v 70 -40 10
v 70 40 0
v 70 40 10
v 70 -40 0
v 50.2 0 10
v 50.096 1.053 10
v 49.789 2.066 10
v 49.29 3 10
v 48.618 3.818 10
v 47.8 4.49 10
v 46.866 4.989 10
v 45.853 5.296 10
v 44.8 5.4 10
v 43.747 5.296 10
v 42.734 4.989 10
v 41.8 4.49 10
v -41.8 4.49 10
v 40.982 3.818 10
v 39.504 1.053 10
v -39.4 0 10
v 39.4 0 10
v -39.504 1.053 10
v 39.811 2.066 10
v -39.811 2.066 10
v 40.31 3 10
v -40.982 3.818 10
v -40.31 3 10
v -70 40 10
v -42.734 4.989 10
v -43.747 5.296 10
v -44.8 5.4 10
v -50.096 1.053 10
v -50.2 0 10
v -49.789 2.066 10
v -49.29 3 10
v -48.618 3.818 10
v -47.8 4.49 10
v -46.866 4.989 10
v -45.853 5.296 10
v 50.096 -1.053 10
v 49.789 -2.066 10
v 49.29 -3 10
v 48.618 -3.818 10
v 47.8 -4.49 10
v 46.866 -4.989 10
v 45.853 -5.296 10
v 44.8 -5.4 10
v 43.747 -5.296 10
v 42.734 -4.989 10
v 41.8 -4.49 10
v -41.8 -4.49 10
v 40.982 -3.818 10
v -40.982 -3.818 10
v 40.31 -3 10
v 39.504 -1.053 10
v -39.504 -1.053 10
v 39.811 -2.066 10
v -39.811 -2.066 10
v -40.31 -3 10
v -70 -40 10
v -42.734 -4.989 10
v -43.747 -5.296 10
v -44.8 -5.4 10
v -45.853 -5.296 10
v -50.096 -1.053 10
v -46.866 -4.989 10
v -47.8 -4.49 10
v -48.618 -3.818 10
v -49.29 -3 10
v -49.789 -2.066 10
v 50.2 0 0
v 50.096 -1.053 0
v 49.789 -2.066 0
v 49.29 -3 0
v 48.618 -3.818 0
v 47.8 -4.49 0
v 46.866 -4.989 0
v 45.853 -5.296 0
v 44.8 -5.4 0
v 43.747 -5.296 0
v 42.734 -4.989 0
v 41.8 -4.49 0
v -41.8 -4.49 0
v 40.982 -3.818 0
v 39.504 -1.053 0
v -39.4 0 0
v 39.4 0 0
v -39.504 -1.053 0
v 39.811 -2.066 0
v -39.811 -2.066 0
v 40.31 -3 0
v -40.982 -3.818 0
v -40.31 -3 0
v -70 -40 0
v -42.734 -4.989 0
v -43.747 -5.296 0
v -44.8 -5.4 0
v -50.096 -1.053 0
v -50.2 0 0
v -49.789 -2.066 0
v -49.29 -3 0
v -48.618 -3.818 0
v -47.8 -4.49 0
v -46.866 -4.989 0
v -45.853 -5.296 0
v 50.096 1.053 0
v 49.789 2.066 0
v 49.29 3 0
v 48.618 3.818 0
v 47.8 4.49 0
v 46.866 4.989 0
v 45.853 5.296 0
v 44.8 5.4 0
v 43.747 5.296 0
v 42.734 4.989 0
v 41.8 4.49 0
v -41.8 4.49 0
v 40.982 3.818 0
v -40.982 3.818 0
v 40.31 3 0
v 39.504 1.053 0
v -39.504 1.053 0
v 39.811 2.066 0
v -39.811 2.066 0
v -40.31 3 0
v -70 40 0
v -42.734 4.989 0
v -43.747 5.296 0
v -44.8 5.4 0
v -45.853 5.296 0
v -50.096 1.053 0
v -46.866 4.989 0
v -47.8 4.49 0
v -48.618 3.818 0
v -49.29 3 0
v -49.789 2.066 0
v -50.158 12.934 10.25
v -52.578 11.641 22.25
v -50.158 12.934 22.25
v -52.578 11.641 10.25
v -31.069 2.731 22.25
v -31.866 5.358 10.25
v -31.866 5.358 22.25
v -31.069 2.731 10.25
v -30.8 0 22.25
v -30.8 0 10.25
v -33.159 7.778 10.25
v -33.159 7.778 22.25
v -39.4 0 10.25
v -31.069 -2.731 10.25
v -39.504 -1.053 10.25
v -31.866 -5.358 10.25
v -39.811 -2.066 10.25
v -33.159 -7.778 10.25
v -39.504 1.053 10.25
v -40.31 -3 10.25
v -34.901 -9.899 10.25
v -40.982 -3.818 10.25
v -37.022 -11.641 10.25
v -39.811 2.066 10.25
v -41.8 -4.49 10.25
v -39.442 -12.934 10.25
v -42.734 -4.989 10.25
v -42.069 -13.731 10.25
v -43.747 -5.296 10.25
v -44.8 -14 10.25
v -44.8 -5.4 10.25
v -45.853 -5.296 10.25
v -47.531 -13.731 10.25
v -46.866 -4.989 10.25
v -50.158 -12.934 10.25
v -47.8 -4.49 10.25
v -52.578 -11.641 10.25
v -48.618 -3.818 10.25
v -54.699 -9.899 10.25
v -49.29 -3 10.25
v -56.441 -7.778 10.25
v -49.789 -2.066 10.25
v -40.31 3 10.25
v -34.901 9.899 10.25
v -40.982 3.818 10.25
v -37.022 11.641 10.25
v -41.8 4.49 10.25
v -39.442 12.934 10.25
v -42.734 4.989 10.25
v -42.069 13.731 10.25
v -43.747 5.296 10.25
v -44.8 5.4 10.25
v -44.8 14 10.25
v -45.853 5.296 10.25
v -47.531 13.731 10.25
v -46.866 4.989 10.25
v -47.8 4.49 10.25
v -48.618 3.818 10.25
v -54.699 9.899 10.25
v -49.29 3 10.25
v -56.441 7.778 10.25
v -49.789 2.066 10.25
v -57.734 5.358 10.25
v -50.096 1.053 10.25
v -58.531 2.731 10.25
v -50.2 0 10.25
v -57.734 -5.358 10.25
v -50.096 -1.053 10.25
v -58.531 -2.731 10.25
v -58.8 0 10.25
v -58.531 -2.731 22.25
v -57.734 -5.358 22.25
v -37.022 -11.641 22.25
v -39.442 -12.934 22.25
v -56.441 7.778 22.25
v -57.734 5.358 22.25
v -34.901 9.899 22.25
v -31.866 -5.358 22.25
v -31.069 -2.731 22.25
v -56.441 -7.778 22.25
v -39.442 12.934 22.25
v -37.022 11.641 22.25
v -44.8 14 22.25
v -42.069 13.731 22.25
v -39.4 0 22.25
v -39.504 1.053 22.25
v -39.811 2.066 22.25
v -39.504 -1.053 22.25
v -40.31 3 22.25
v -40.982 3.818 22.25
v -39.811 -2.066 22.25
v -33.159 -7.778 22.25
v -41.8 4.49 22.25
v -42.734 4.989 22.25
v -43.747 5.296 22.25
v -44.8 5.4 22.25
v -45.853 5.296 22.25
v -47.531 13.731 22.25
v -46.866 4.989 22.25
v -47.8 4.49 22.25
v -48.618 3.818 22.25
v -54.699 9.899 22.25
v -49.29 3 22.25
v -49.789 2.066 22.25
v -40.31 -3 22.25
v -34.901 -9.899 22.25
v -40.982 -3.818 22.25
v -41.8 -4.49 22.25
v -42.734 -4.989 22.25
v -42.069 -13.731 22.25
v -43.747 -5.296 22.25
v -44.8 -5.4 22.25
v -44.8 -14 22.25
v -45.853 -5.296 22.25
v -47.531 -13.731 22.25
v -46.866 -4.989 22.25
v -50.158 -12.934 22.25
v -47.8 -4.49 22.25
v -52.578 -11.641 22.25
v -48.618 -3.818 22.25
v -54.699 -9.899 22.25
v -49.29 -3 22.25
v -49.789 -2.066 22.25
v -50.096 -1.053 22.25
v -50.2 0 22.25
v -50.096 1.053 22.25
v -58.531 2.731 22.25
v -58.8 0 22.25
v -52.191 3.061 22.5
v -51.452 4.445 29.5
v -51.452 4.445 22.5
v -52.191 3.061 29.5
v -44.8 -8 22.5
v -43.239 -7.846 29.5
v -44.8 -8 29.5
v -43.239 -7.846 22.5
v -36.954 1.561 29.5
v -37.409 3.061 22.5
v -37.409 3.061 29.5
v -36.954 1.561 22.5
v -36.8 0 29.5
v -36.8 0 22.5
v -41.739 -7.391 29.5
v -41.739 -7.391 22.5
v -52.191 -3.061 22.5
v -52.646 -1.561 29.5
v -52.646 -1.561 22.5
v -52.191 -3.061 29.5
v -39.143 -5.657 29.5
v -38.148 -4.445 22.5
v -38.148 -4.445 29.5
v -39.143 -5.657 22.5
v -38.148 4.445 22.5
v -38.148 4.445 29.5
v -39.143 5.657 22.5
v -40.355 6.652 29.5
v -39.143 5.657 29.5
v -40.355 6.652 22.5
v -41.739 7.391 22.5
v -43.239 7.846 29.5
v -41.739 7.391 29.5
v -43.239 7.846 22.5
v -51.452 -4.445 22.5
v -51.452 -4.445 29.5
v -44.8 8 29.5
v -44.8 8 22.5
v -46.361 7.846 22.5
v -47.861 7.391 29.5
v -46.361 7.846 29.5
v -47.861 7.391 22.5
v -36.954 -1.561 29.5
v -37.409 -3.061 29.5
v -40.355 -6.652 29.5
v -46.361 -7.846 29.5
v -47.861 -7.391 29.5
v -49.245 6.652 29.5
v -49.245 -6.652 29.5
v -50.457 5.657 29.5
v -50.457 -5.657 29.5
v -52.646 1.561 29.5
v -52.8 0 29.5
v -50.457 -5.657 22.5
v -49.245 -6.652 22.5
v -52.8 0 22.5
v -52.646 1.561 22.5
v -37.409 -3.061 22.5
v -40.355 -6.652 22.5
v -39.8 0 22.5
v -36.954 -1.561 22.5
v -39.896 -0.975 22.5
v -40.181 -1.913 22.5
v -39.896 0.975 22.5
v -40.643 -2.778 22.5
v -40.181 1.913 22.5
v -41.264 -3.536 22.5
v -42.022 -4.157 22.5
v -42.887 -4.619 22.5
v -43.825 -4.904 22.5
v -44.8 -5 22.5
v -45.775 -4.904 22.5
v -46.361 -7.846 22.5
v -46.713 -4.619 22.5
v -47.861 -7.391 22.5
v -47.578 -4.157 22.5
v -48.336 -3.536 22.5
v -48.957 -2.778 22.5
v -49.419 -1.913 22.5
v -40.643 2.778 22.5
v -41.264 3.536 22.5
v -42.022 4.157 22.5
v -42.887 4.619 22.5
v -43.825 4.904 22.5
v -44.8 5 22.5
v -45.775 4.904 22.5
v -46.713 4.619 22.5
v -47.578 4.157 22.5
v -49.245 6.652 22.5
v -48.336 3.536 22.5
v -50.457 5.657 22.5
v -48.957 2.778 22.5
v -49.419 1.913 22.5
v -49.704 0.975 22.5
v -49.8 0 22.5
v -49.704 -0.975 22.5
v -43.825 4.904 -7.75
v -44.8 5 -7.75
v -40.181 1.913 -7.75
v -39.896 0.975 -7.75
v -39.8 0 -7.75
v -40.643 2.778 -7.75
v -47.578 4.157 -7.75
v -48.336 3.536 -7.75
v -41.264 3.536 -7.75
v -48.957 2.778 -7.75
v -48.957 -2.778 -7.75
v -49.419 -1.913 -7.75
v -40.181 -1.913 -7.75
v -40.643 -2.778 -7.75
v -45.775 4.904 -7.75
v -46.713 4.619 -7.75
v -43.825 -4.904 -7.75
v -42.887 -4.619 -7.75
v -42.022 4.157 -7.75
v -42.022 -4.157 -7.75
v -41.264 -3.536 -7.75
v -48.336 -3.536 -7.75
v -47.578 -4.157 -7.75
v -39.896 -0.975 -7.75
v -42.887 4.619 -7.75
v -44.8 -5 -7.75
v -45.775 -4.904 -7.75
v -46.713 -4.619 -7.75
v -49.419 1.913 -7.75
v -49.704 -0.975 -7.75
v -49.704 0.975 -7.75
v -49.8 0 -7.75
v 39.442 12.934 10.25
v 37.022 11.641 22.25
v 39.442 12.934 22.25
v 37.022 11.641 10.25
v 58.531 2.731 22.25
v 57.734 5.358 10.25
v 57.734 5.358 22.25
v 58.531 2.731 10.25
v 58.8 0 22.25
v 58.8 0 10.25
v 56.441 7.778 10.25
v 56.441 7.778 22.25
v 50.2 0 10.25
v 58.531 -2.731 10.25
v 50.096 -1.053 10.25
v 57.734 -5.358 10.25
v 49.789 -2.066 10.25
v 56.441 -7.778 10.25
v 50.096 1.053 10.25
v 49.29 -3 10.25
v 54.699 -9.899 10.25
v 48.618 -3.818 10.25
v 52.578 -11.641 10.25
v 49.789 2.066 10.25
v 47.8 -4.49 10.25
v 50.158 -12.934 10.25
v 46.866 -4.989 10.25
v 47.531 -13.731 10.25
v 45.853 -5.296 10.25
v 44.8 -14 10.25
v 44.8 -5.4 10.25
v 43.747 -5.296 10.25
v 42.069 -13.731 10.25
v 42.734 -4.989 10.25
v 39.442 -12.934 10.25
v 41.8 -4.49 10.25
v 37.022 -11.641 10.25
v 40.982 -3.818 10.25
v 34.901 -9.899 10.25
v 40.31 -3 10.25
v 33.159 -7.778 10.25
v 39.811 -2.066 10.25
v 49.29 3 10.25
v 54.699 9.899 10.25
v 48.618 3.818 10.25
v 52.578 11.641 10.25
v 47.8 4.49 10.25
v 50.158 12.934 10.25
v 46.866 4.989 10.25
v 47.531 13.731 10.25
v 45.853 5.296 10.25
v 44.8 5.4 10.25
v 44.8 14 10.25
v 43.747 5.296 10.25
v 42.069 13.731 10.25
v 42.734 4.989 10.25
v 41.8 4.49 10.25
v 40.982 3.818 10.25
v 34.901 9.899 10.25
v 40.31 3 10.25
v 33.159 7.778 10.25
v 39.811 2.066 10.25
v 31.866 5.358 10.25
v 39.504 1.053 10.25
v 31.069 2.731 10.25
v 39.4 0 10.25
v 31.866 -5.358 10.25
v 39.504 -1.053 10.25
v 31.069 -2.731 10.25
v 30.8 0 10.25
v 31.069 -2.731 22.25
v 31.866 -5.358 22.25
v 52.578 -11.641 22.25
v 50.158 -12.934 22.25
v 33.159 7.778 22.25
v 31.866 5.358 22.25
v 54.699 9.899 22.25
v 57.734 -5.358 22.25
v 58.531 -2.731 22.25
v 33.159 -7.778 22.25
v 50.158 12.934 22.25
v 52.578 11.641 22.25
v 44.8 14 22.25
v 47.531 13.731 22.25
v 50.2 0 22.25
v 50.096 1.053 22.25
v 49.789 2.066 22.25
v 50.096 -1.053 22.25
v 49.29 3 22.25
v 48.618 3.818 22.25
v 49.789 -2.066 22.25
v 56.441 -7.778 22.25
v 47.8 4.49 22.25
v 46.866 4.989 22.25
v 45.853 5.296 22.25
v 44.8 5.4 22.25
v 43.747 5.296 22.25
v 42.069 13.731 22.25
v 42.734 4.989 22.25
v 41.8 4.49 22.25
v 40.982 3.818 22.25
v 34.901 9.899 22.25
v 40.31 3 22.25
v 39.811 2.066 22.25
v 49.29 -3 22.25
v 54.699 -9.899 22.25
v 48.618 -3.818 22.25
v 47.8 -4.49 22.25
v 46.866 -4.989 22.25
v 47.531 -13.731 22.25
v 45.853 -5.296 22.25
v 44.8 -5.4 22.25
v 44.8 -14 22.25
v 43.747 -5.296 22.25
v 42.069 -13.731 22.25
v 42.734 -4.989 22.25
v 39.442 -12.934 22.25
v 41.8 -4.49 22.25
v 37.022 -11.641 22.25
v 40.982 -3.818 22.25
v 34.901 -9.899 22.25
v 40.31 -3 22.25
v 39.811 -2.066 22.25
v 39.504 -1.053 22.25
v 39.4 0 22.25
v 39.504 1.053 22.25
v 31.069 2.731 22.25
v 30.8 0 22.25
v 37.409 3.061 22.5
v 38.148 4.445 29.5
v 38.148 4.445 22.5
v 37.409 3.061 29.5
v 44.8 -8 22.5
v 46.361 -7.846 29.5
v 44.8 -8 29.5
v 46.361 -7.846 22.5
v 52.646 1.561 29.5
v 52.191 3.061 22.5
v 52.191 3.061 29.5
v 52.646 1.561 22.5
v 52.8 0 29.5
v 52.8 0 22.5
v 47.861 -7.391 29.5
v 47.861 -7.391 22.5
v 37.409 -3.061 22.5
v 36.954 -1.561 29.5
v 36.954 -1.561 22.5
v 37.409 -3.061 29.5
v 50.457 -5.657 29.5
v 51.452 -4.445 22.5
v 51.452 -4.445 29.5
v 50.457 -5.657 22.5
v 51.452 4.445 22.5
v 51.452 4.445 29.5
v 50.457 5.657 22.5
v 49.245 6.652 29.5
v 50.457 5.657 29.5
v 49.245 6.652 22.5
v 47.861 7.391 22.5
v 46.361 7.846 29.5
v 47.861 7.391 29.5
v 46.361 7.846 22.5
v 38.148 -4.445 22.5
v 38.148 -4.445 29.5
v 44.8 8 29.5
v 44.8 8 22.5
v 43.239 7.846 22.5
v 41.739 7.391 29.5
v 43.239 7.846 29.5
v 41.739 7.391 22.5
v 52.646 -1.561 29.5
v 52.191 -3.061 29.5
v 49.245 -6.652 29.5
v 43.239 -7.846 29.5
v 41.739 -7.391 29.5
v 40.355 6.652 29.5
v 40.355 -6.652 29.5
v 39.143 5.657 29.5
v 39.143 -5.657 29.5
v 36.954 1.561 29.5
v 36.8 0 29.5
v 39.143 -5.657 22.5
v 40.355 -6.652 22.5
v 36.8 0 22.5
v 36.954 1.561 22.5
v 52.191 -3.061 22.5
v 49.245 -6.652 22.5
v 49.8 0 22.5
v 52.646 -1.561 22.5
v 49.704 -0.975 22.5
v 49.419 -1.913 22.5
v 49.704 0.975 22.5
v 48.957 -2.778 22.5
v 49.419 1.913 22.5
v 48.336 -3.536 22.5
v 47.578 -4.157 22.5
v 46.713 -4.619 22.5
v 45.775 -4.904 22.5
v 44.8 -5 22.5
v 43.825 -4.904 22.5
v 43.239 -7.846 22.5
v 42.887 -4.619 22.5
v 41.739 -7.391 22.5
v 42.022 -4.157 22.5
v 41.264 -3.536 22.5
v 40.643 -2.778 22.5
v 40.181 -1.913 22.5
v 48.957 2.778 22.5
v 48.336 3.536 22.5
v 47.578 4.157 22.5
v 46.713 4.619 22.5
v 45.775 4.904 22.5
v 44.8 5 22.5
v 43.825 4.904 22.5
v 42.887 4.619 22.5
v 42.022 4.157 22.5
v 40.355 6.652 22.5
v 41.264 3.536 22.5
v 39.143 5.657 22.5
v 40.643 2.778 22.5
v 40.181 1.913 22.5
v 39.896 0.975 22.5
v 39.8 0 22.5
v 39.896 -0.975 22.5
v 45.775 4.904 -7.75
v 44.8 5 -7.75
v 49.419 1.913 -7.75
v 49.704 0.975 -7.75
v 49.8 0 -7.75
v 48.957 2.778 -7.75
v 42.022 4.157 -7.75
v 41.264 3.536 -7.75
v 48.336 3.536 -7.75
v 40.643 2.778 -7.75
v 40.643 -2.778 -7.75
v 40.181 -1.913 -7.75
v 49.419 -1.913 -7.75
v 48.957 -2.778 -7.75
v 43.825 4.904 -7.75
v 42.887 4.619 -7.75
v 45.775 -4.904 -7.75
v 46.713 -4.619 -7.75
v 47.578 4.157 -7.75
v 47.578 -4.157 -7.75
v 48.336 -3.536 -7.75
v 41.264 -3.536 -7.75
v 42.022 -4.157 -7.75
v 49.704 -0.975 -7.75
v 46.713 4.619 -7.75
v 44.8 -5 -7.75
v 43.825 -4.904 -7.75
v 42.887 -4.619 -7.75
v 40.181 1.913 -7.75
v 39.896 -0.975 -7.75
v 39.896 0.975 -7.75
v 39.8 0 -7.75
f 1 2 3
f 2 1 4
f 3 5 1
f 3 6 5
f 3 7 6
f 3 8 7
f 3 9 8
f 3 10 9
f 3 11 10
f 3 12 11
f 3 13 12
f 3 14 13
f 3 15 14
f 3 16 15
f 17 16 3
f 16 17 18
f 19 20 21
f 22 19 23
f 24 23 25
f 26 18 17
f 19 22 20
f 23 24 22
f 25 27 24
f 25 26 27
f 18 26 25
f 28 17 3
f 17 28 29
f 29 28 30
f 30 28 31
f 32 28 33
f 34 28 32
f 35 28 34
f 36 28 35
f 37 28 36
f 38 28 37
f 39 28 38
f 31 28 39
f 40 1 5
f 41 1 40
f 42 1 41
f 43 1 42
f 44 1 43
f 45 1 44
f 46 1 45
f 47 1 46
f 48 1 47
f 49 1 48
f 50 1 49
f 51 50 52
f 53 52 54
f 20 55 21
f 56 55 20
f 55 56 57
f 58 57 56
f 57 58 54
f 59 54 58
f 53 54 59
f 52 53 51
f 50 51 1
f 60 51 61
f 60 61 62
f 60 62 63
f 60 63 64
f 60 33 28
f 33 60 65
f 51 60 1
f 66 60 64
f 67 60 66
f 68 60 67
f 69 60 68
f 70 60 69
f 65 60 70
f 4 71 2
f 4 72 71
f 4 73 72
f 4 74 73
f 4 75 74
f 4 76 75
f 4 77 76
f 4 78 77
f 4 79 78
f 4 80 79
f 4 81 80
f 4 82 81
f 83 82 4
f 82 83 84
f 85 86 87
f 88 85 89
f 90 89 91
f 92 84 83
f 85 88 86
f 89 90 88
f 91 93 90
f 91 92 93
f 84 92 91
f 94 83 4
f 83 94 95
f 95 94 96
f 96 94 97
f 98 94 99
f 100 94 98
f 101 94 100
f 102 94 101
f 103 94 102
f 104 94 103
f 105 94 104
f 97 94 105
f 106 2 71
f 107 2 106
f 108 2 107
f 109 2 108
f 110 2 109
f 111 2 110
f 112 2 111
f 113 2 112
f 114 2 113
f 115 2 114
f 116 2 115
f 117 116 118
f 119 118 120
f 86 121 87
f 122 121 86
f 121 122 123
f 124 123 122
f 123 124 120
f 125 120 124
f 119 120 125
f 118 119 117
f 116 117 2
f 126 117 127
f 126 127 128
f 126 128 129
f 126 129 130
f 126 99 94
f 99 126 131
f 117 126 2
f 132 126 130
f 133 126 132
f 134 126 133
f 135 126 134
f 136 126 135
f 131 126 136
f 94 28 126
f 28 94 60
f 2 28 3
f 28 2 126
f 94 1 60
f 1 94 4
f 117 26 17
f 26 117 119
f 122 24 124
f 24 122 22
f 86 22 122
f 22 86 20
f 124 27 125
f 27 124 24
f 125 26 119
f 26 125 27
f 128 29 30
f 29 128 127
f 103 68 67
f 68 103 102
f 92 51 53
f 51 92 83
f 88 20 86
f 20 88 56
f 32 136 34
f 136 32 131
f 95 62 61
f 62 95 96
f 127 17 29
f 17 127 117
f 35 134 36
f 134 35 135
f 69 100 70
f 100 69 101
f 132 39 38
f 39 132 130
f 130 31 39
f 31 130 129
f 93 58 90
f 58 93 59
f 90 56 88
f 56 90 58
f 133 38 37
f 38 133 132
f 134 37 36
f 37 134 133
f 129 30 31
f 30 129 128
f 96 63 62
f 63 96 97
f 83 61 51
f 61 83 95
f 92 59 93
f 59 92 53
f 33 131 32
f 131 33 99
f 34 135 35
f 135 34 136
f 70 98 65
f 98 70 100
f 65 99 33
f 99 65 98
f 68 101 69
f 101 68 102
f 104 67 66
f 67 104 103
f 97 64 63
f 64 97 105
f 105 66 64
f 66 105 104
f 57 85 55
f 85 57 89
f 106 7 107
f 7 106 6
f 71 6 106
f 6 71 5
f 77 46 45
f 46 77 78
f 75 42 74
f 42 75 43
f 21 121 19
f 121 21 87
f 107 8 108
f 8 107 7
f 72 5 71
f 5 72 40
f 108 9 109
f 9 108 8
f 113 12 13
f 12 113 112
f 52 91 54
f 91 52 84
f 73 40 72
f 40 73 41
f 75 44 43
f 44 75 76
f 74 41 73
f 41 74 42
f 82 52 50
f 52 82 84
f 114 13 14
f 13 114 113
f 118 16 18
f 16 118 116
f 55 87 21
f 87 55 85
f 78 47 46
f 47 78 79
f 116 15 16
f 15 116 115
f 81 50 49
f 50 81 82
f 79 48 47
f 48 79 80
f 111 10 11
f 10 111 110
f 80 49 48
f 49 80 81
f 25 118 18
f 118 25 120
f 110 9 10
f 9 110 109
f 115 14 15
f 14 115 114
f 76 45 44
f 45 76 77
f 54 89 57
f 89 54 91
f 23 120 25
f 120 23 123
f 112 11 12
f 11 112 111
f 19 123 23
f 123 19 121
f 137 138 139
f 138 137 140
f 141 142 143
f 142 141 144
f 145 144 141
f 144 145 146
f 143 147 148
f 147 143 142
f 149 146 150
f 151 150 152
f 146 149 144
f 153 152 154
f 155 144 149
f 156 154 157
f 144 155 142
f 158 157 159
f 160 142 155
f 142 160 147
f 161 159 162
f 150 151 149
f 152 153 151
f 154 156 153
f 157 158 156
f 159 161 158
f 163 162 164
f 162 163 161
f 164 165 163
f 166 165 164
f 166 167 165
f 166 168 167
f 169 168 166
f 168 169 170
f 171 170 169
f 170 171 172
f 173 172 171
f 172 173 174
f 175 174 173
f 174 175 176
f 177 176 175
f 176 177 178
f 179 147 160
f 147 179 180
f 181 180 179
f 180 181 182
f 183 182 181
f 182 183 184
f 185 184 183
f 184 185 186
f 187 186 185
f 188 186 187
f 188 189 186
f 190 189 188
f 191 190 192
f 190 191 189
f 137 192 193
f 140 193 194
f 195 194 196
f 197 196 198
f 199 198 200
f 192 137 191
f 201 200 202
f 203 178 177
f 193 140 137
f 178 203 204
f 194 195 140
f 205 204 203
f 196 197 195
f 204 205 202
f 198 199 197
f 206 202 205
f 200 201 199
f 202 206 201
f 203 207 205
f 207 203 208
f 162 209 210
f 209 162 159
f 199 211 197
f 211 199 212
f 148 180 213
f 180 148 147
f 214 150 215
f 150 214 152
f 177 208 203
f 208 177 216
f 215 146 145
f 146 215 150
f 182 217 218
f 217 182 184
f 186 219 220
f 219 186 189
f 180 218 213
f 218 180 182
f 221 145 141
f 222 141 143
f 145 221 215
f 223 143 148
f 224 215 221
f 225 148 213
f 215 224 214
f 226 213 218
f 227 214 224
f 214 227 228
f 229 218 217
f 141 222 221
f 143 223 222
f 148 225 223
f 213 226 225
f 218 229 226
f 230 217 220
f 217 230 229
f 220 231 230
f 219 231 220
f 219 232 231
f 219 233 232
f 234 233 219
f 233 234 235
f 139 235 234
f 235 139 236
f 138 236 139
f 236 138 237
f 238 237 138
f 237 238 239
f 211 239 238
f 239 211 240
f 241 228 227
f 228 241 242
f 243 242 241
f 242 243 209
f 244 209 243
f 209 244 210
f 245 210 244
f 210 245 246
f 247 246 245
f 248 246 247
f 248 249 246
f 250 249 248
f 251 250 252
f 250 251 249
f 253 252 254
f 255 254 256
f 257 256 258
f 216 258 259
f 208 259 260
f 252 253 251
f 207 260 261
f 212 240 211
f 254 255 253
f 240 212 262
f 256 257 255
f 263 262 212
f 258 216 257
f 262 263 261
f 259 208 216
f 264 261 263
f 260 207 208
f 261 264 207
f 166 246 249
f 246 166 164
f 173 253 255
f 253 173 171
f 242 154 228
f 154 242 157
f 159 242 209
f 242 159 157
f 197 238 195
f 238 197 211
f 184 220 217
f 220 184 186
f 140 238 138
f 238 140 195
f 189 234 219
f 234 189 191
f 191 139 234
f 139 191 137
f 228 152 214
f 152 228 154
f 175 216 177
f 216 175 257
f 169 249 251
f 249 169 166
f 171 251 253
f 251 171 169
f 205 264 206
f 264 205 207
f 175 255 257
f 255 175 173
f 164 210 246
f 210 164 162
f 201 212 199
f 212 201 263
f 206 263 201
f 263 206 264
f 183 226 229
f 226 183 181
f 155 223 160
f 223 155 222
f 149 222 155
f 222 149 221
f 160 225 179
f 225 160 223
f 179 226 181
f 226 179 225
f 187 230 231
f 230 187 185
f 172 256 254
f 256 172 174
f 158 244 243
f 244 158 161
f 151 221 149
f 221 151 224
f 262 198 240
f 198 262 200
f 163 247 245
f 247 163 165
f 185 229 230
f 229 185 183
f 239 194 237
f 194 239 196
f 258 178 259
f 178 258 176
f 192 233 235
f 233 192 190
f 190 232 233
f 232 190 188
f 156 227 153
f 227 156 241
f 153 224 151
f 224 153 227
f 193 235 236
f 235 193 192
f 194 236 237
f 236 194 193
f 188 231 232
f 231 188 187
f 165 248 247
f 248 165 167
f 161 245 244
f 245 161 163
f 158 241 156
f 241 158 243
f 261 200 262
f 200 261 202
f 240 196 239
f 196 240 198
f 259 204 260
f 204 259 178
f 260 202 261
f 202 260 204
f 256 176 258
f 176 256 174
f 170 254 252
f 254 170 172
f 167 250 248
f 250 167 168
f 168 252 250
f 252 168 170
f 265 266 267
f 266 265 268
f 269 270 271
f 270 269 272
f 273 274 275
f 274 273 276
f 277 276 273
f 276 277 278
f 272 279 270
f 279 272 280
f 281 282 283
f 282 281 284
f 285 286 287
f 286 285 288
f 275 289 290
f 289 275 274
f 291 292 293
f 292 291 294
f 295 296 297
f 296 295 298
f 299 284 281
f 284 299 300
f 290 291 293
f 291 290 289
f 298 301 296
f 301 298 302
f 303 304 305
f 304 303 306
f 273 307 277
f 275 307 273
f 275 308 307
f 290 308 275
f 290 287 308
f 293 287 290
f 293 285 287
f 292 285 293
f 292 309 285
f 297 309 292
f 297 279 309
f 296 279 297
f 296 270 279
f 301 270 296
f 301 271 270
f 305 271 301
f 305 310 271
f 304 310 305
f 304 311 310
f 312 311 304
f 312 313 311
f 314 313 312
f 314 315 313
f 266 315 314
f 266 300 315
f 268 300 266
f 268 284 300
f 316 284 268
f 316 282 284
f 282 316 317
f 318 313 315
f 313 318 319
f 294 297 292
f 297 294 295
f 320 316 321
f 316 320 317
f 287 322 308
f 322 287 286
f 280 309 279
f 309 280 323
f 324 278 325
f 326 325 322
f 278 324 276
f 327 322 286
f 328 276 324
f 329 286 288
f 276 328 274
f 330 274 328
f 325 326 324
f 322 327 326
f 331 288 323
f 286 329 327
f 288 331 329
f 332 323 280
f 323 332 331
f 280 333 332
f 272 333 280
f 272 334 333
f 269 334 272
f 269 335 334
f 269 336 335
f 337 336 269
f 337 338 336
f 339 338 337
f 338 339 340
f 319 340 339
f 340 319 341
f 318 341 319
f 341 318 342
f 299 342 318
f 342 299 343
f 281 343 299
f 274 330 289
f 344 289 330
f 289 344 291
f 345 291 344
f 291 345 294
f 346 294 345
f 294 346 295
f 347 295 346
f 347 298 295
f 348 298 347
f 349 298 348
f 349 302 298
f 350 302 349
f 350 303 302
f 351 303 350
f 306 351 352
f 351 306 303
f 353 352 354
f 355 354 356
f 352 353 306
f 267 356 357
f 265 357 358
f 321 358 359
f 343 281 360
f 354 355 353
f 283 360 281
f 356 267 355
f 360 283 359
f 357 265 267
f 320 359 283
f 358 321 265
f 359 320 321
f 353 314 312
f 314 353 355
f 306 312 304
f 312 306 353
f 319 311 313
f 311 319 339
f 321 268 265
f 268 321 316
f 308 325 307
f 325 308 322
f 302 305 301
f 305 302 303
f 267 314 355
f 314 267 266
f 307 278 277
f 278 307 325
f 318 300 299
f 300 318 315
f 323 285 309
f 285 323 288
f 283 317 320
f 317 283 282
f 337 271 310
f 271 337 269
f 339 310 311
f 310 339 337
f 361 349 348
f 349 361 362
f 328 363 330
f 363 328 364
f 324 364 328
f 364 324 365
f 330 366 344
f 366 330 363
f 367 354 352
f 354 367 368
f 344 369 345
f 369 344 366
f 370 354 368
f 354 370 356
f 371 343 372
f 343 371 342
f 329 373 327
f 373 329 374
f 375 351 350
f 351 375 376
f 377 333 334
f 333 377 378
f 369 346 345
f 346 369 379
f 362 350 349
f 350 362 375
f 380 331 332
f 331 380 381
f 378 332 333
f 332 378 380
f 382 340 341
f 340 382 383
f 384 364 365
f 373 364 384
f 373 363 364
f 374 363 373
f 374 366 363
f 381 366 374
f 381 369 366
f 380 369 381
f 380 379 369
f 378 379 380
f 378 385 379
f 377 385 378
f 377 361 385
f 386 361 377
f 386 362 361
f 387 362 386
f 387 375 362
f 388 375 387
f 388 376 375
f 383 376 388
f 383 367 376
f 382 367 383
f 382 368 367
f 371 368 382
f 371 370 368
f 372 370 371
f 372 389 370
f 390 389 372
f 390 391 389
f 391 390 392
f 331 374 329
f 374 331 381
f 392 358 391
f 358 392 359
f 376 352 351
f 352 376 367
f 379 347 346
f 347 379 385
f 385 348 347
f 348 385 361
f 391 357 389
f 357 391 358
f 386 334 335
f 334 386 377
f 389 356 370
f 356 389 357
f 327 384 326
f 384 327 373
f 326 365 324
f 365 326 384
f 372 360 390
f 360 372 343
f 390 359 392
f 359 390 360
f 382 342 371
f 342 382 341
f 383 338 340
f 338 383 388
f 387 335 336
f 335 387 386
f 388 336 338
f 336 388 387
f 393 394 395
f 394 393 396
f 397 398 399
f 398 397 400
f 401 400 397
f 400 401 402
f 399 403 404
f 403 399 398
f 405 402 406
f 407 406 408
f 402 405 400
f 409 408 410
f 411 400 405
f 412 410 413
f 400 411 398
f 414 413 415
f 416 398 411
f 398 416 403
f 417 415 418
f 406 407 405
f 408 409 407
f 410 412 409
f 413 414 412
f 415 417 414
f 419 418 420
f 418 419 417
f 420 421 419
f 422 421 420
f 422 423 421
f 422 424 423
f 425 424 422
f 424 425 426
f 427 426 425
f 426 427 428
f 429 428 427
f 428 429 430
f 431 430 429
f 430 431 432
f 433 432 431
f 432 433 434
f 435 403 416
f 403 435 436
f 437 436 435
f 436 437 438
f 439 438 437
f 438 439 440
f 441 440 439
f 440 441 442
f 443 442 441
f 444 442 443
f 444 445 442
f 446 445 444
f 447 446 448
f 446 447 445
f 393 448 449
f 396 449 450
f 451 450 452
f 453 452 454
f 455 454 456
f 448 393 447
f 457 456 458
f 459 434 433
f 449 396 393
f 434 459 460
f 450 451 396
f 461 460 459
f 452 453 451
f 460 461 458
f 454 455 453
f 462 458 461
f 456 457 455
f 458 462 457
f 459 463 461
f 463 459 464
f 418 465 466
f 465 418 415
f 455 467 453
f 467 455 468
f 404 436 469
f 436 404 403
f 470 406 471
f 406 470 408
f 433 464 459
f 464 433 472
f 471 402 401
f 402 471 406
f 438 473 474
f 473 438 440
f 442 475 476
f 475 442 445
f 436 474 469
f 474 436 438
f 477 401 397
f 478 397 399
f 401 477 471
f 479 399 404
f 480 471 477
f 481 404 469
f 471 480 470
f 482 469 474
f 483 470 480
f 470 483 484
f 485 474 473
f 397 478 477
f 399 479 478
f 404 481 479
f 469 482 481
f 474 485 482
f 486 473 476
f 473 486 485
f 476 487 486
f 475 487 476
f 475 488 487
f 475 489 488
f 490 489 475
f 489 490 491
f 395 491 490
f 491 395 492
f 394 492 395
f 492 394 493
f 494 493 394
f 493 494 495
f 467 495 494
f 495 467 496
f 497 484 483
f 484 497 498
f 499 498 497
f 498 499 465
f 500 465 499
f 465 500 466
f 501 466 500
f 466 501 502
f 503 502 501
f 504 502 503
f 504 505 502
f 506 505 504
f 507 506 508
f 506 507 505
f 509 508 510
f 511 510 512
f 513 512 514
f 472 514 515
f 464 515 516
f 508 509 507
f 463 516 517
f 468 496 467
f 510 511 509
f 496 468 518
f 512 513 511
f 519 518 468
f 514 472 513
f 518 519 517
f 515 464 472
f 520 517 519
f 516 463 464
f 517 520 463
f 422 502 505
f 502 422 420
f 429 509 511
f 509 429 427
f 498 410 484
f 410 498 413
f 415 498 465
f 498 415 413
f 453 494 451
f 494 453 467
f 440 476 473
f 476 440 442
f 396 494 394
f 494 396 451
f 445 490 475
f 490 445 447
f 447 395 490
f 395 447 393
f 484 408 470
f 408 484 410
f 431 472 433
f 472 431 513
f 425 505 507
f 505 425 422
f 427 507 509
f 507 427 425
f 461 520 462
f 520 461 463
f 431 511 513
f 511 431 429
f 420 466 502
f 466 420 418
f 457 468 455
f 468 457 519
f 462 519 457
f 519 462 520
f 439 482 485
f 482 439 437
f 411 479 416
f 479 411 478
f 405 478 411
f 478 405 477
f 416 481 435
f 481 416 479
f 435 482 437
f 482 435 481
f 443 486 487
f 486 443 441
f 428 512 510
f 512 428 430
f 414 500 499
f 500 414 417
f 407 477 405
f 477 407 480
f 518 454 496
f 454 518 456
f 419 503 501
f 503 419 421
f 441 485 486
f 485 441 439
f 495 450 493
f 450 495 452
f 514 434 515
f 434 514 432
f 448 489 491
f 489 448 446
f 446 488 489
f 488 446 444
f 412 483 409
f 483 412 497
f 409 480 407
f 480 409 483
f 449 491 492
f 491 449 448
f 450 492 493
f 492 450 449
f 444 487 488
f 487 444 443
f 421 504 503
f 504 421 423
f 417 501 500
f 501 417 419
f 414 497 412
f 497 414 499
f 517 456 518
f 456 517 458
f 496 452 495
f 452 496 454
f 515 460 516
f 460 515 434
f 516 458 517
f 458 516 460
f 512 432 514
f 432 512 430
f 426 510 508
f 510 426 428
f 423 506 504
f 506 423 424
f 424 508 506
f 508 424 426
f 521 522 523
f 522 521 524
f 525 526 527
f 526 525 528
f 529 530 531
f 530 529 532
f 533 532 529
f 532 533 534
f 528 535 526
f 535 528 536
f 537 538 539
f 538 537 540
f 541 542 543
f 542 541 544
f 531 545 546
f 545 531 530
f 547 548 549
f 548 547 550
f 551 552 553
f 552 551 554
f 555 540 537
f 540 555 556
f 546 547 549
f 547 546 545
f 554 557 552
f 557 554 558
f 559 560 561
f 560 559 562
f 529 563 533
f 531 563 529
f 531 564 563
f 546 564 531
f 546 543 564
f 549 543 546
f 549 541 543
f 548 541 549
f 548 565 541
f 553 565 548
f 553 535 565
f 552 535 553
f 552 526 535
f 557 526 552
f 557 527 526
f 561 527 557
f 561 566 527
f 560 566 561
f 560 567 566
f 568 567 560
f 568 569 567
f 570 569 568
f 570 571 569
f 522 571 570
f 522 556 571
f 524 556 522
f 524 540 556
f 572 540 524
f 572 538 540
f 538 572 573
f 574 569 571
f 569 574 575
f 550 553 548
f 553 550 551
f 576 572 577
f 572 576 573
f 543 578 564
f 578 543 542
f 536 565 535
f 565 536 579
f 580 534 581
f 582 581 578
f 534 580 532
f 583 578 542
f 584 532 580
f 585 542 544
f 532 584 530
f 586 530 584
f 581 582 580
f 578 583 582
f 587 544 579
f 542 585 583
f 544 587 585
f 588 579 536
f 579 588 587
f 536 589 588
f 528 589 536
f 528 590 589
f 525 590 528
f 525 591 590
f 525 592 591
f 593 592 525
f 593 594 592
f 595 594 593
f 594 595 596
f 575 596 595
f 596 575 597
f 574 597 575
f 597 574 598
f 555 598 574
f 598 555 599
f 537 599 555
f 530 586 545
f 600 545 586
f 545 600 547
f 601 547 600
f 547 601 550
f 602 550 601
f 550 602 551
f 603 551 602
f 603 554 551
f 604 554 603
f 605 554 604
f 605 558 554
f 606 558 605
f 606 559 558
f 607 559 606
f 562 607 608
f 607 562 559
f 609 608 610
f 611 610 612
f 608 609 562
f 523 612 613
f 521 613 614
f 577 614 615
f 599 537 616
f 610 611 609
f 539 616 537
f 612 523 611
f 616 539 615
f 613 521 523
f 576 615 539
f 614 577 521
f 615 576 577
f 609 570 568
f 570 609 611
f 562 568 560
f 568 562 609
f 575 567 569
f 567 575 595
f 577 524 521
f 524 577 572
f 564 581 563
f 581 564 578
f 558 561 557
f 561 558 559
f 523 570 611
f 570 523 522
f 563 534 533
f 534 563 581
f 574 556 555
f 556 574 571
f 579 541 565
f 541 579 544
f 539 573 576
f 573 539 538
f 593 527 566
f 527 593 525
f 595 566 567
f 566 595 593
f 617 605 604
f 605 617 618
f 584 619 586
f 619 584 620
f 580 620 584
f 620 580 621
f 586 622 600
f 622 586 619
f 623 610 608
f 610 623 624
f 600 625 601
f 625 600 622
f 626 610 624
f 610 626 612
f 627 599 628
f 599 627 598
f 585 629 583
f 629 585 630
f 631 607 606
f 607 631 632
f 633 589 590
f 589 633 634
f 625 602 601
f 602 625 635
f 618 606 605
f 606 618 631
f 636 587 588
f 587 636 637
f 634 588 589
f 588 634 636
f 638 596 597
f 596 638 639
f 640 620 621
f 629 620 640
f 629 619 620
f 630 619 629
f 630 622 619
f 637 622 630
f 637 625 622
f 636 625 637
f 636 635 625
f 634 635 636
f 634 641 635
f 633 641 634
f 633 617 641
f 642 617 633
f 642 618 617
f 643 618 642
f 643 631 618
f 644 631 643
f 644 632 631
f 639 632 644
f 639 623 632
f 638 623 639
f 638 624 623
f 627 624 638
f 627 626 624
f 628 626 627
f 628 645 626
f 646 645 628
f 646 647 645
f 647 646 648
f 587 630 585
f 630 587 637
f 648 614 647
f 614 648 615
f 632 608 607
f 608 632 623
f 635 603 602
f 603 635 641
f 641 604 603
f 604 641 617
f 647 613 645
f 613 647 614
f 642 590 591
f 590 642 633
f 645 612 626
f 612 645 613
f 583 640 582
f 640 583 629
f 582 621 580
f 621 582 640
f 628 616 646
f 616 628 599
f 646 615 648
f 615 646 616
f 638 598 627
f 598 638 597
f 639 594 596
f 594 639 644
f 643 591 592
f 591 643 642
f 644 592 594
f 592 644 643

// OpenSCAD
$fn = 32;

// ------------------------------------------------------------------------
// Standoff columns: 2 d28 standoffs, bolts d10
// Every part is its own module, assembly() places them once.
// ------------------------------------------------------------------------

// --- part 1 ---
module base_plate() {
  difference() {
    translate([-70, -40, 0]) cube([140, 80, 10]);
    translate([-44.8, 0, -1]) cylinder(h = 12, d = 10.8);
    translate([44.8, 0, -1]) cylinder(h = 12, d = 10.8);
  }
}

// --- part 2 ---
module spacer1() {
  difference() {
      translate([0, 0, 0]) cylinder(h = 12, d = 28);
      translate([0, 0, -1]) cylinder(h = 14, d = 10.8);
    }
}

// --- part 3 ---
module bolt1() {
  cylinder(h = 7, d = 16);
  translate([0, 0, -30.25]) cylinder(h = 30.25, d = 10);
}

// --- part 4 ---
module spacer2() {
  difference() {
      translate([0, 0, 0]) cylinder(h = 12, d = 28);
      translate([0, 0, -1]) cylinder(h = 14, d = 10.8);
    }
}

// --- part 5 ---
module bolt2() {
  cylinder(h = 7, d = 16);
  translate([0, 0, -30.25]) cylinder(h = 30.25, d = 10);
}

// --- assembly ---
module assembly() {
  translate([0, 0, 0]) rotate([0, 0, 0]) base_plate();
  translate([-44.8, 0, 10.25]) rotate([0, 0, 0]) spacer1();
  translate([-44.8, 0, 22.5]) rotate([0, 0, 0]) bolt1();
  translate([44.8, 0, 10.25]) rotate([0, 0, 0]) spacer2();
  translate([44.8, 0, 22.5]) rotate([0, 0, 0]) bolt2();
}

assembly();
